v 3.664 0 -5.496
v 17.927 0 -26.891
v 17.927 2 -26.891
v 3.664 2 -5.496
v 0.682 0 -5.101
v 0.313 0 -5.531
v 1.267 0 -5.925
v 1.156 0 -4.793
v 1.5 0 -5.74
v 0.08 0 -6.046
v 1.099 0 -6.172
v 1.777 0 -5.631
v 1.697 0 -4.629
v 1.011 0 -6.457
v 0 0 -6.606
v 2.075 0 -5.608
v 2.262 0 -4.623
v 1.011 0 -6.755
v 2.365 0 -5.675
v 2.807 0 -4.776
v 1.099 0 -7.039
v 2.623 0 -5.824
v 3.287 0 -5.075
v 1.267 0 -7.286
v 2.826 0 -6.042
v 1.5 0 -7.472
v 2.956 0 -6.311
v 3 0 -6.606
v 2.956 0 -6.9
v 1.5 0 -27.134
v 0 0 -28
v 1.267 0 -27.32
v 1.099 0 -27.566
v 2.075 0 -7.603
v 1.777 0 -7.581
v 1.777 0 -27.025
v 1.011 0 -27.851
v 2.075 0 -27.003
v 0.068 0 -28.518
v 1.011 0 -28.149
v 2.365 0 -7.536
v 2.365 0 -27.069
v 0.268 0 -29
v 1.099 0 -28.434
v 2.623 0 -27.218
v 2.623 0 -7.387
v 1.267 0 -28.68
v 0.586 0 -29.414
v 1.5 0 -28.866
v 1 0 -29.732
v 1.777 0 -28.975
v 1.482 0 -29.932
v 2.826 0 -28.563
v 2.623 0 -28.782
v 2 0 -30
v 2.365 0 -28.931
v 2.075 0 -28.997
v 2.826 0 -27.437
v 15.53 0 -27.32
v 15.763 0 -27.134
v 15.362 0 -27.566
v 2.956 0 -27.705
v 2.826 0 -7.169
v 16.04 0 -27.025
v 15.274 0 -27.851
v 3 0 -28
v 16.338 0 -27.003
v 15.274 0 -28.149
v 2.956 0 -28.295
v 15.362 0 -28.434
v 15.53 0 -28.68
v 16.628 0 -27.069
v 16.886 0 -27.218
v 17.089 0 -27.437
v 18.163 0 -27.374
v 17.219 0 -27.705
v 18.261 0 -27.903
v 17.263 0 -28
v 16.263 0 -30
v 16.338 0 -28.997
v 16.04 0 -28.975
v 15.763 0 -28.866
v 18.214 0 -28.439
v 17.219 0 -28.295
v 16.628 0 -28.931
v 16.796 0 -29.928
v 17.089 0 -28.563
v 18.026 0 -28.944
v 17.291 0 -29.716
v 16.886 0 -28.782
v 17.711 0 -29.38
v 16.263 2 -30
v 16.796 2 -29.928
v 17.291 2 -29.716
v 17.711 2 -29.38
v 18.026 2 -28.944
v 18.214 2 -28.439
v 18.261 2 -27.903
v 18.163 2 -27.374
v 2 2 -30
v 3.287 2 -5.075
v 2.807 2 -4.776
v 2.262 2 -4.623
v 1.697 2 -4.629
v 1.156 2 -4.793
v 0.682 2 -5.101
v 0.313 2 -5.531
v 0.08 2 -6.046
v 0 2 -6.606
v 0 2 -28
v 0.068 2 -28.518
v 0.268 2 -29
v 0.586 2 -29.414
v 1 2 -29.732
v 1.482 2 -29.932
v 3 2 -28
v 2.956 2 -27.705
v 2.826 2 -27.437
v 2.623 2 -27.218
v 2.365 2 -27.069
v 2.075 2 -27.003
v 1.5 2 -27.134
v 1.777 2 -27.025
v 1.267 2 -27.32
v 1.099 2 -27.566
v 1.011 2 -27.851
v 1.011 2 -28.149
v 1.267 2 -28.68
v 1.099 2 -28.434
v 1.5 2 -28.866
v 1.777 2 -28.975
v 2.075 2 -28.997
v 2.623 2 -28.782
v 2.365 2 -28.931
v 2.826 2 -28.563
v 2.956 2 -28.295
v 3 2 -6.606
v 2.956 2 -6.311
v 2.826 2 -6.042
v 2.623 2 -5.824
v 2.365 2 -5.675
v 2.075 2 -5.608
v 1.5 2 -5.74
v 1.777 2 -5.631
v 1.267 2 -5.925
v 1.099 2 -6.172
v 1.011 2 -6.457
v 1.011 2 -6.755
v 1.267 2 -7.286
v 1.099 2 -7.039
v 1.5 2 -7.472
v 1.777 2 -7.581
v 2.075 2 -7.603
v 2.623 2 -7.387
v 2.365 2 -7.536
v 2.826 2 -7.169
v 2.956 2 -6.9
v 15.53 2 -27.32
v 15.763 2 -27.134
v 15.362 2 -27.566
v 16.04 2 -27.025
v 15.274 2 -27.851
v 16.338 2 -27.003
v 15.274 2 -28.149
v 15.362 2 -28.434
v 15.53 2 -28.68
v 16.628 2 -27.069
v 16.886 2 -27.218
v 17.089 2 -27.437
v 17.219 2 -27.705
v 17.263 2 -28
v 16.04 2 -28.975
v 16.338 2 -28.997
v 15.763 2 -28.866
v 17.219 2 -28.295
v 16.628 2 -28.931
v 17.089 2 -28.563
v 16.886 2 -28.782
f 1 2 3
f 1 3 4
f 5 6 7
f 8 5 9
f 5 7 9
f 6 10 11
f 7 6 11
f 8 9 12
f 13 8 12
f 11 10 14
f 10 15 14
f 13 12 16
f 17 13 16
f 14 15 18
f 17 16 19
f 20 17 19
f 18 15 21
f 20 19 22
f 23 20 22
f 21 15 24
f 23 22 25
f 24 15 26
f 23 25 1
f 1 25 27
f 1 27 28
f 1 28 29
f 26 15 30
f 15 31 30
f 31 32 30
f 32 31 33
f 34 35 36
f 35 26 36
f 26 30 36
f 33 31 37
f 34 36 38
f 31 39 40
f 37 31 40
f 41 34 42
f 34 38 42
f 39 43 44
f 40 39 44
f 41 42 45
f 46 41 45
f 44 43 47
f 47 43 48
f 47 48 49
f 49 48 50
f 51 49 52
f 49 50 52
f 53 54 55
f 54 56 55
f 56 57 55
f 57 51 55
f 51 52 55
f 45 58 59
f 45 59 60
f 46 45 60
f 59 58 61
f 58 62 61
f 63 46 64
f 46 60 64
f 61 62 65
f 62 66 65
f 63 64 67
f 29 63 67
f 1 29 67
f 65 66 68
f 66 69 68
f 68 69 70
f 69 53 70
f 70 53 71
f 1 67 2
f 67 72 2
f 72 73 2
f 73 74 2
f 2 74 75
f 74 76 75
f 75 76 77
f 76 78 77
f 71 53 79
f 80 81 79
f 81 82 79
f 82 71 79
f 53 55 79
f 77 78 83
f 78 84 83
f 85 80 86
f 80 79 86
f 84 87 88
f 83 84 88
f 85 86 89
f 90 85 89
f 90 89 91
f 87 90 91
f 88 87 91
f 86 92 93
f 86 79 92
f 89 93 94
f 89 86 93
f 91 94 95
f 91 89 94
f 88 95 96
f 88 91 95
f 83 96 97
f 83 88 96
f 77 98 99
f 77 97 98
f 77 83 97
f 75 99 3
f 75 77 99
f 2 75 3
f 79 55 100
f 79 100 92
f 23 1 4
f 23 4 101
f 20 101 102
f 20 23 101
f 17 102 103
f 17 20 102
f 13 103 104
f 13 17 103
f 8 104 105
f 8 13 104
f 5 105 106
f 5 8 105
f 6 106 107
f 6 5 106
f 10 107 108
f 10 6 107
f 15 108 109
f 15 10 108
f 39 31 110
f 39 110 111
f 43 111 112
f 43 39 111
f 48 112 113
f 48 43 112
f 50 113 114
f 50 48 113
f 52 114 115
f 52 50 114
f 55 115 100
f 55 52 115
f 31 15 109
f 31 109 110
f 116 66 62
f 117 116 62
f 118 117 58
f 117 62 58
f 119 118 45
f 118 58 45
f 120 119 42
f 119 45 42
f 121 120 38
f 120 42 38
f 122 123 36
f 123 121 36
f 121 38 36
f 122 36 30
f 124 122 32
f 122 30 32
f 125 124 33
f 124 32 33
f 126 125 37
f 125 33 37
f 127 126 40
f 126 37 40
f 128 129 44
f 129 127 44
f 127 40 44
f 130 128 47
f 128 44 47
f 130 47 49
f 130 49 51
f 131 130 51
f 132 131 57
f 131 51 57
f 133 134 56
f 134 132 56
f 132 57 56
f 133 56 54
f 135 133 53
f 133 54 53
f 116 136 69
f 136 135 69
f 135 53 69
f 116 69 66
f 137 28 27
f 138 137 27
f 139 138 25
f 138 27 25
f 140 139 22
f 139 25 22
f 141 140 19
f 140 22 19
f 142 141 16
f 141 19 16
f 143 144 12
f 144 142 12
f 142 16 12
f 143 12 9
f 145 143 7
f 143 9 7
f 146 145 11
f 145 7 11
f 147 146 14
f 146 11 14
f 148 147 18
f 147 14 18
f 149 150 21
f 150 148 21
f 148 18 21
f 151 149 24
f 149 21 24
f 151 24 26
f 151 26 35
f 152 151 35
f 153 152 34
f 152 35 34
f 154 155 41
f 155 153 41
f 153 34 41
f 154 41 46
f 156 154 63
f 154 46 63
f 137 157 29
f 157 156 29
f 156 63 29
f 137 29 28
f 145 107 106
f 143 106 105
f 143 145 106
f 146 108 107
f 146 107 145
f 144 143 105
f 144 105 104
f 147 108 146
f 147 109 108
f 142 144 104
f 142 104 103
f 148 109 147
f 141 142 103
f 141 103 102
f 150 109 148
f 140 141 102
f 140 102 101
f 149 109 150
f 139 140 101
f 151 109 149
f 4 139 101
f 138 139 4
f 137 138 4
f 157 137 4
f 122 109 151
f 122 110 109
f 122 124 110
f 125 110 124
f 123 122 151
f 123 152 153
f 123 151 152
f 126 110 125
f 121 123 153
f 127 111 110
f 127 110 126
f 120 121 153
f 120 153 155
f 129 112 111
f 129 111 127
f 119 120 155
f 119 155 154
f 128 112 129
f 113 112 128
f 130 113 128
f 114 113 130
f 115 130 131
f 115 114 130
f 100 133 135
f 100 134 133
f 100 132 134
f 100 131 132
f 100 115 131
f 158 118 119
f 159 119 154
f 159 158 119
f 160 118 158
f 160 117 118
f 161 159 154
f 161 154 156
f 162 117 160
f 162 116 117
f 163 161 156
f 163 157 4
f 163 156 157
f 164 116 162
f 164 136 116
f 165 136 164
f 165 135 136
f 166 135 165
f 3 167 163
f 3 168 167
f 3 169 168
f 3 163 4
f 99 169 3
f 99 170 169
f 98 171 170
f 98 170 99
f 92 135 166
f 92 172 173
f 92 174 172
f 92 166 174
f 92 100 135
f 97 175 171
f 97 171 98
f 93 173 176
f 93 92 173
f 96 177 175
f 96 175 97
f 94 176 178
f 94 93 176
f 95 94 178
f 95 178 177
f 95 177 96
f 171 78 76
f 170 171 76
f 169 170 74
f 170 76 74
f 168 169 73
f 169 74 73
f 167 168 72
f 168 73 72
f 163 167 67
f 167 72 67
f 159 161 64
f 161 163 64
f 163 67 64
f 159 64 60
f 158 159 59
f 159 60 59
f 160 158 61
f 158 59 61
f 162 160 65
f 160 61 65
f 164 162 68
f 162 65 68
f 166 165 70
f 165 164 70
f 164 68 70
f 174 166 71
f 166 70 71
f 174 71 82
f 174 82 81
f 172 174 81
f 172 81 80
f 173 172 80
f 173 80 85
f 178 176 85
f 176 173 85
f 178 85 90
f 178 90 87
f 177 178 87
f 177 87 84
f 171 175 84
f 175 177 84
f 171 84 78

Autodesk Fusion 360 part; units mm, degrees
sketch "Sketch1" plane through (0, 0, 0) normal (0, 1, 0) x (1, 0, 0)
  line L0 (0, 6.6056) -> (0, 28)
  line L1 (2, 30) -> (16.263, 30)
  line L2 (17.9271, 26.8906) -> (3.6641, 5.4962)
  arc A0 (2, 30) -> (0, 28) centre (2, 28) ccw
  arc A1 (0, 6.6056) -> (3.6641, 5.4962) centre (2, 6.6056) ccw
  arc A2 (17.9271, 26.8906) -> (16.263, 30) centre (16.263, 28) ccw
  circle A3 centre (2, 28) radius 1
  circle A4 centre (16.263, 28) radius 1
  circle A5 centre (2, 6.6056) radius 1
  point P0 (0, 30)
  point P1 (20, 30)
  dimension "d1" = 20
  dimension "d2" = 30
  dimension "d3" = 2
  dimension "d4" = 2
  dimension "d5" = 2
  dimension "d6" = 2
  dimension "d7" = 2
  dimension "d8" = 2
extrude "Extrude1" add sketch "Sketch1" along normal blind 2
